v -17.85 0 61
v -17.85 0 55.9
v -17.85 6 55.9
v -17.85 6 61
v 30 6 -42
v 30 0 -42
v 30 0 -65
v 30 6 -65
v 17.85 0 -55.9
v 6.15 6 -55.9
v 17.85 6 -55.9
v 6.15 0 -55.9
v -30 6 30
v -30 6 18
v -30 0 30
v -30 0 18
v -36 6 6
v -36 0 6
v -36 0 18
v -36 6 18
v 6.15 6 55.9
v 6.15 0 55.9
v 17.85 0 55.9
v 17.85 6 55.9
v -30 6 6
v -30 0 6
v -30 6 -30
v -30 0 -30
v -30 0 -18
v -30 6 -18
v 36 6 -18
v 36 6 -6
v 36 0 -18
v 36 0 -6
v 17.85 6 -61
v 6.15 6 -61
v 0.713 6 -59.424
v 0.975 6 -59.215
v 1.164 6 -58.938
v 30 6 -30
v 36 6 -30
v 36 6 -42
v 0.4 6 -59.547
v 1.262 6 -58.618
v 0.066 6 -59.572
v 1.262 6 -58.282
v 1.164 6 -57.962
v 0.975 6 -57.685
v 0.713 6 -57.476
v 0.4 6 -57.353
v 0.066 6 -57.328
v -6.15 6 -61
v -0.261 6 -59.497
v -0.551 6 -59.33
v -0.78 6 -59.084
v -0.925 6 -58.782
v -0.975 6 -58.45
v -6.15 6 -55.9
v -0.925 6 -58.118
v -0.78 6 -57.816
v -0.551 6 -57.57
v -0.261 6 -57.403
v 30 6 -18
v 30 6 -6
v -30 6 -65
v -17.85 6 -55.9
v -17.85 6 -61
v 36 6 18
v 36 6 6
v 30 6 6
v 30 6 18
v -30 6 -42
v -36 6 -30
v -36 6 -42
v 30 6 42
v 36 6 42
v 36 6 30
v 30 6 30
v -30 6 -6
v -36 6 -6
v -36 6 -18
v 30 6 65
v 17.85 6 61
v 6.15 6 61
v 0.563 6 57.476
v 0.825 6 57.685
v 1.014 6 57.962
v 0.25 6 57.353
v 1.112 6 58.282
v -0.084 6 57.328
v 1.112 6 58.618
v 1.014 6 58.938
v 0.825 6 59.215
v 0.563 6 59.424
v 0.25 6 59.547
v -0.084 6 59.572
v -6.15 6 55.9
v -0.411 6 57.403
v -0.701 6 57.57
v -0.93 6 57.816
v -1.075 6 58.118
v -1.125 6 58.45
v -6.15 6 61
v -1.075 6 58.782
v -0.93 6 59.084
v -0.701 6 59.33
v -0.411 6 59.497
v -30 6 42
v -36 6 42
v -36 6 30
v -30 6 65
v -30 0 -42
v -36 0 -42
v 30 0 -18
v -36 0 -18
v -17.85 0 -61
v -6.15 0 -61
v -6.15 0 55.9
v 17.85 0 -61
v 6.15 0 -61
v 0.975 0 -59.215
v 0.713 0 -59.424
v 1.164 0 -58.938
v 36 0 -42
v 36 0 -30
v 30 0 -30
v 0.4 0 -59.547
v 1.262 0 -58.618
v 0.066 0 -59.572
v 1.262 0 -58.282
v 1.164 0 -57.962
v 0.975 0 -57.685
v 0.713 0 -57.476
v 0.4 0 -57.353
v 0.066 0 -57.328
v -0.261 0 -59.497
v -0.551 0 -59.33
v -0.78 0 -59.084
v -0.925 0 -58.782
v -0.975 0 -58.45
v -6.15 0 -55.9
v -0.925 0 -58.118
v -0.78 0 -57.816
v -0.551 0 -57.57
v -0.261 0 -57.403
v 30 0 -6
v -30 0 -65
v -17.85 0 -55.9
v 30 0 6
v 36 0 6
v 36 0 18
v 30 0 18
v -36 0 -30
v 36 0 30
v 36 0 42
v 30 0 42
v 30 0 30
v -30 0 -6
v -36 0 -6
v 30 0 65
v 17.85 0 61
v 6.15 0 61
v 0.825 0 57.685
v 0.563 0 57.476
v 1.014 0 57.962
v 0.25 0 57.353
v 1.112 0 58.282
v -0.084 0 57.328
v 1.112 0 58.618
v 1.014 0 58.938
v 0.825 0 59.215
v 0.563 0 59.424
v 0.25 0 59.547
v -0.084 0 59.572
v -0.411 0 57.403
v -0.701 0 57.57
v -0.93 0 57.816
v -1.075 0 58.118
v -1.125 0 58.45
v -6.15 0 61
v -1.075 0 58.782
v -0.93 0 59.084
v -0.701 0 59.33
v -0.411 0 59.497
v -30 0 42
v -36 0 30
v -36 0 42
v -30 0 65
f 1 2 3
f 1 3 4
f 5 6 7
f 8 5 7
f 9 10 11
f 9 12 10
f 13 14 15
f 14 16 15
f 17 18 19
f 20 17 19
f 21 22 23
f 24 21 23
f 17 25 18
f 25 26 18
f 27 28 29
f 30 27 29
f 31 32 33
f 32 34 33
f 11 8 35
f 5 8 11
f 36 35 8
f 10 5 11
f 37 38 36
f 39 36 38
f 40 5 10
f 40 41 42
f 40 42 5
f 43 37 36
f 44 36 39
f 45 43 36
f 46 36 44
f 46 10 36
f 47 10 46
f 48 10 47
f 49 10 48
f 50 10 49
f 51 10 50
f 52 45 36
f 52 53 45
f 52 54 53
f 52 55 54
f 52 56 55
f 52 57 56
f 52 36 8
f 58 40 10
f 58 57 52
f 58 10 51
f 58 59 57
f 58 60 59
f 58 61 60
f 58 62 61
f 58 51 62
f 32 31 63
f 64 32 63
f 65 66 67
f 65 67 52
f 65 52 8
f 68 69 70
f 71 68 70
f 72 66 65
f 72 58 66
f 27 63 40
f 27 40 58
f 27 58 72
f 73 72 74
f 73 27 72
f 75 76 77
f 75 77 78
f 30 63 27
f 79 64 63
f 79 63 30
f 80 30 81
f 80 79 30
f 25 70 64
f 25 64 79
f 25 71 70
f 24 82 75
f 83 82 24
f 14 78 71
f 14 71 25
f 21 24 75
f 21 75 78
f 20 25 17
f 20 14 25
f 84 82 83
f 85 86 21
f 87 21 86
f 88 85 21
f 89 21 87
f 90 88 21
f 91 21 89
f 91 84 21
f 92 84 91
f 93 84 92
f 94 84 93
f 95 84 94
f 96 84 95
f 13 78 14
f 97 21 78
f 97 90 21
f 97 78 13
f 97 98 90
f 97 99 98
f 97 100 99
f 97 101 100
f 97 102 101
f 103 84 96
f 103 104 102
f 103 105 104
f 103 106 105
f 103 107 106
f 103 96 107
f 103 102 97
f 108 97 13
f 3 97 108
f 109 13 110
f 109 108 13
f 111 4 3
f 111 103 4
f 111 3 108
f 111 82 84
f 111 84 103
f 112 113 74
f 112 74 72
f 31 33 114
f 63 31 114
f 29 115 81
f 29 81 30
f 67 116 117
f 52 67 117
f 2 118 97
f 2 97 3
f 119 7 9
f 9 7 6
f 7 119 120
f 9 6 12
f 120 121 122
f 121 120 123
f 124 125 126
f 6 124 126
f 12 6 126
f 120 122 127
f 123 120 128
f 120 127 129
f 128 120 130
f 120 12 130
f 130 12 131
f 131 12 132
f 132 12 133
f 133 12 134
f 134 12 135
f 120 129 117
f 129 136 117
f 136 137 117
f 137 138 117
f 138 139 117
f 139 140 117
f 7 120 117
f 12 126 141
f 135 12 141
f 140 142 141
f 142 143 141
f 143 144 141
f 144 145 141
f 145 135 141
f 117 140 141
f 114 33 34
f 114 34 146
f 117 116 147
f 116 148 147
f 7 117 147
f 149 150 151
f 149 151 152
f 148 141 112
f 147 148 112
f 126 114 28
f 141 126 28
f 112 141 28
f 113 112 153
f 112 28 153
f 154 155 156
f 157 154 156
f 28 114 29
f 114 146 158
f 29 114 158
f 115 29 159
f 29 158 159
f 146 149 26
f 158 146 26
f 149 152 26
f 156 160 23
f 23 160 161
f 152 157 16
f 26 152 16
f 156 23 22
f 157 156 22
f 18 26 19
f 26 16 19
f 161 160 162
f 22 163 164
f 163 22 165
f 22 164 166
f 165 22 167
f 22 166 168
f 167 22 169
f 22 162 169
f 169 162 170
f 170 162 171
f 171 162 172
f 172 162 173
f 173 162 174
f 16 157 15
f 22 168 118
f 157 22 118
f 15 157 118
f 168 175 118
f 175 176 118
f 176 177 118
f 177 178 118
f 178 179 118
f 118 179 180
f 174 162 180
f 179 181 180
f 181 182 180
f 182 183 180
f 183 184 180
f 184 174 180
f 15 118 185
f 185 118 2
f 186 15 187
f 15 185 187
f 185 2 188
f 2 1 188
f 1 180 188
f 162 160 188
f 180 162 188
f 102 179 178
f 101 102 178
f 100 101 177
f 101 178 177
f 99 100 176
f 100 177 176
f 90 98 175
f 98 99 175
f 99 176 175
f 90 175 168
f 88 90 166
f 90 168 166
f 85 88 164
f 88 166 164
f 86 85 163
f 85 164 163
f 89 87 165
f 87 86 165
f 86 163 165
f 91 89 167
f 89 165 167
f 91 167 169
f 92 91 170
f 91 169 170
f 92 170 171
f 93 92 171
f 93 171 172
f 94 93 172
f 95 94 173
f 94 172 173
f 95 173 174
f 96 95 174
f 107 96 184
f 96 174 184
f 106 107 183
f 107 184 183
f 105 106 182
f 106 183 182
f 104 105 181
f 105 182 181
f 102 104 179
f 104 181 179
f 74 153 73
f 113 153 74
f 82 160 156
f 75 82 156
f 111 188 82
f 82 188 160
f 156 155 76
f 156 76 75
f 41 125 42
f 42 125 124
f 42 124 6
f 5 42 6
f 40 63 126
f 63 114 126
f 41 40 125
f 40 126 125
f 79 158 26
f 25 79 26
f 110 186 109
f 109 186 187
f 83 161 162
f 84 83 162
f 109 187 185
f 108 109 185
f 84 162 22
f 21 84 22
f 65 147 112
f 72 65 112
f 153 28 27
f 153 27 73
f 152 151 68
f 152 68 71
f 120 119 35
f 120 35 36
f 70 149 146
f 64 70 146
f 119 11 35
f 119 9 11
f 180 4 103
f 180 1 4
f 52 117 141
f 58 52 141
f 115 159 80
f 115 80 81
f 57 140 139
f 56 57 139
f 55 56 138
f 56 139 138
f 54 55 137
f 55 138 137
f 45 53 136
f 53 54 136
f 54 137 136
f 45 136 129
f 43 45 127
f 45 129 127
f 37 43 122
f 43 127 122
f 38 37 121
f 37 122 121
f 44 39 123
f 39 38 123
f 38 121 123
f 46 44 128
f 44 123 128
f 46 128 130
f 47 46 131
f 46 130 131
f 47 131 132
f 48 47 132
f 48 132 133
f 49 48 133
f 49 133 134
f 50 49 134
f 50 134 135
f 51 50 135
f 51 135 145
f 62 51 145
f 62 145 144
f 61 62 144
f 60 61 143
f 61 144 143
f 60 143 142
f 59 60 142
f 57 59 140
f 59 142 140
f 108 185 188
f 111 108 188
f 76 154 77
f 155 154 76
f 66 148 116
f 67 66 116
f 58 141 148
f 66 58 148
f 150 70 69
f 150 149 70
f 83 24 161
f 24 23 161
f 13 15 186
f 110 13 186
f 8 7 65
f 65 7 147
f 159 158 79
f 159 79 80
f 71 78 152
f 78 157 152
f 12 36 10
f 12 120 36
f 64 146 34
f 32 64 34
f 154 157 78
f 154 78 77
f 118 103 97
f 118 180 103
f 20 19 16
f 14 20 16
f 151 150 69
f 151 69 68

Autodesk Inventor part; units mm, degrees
ref_plane "YZ Plane" through (0, 0, 0) normal (1, 0, 0) x (0, 1, 0)
ref_plane "XZ Plane" through (0, 0, 0) normal (0, 1, 0) x (-1, 0, 0)
ref_plane "XY Plane" through (0, 0, 0) normal (0, 0, 1) x (1, 0, 0)
sketch "Sketch1" plane through (0, 0, 0) normal (0, 1, 0) x (-1, 0, 0)
  line L0 (30, 65) -> (-30, 65)
  line L1 (-30, 65) -> (-30, -65)
  line L2 (-30, -65) -> (30, -65)
  line L3 (30, -65) -> (30, 65)
  line L4 (30, 65) -> (-30, -65) construction
  line L5 (-30, 65) -> (30, -65) construction
  line L6 (-17.85, 61) -> (-6.15, 61)
  line L7 (-6.15, 61) -> (-6.15, 55.9)
  line L8 (-6.15, 55.9) -> (-17.85, 55.9)
  line L9 (-17.85, 55.9) -> (-17.85, 61)
  line L10 (-30, 6) -> (-36, 6)
  line L11 (-36, 6) -> (-36, 18)
  line L12 (-36, 18) -> (-30, 18)
  line L13 (-30, 18) -> (-30, 6)
  line L14 (-30, 30) -> (-36, 30)
  line L15 (-36, 30) -> (-36, 42)
  line L16 (-36, 42) -> (-30, 42)
  line L17 (-30, 42) -> (-30, 30)
  line L18 (0, 0) -> (0, 6.5854)
  line L19 (0, 6.5854) -> (0, 0)
  line L20 (0, 0) -> (-5.5856, 0)
  line L21 (17.85, 61) -> (6.15, 61)
  line L22 (6.15, 61) -> (6.15, 55.9)
  line L23 (6.15, 55.9) -> (17.85, 55.9)
  line L24 (17.85, 55.9) -> (17.85, 61)
  line L25 (30, 6) -> (36, 6)
  line L26 (36, 6) -> (36, 18)
  line L27 (36, 18) -> (30, 18)
  line L28 (30, 18) -> (30, 6)
  line L29 (30, 30) -> (36, 30)
  line L30 (36, 30) -> (36, 42)
  line L31 (36, 42) -> (30, 42)
  line L32 (30, 42) -> (30, 30)
  line L33 (-17.85, -61) -> (-6.15, -61)
  line L34 (-6.15, -61) -> (-6.15, -55.9)
  line L35 (-6.15, -55.9) -> (-17.85, -55.9)
  line L36 (-17.85, -55.9) -> (-17.85, -61)
  line L37 (-30, -6) -> (-36, -6)
  line L38 (-36, -6) -> (-36, -18)
  line L39 (-36, -18) -> (-30, -18)
  line L40 (-30, -18) -> (-30, -6)
  line L41 (-30, -30) -> (-36, -30)
  line L42 (-36, -30) -> (-36, -42)
  line L43 (-36, -42) -> (-30, -42)
  line L44 (-30, -42) -> (-30, -30)
  line L45 (6.15, -55.9) -> (17.85, -55.9)
  line L46 (17.85, -61) -> (6.15, -61)
  line L47 (6.15, -61) -> (6.15, -55.9)
  line L48 (17.85, -55.9) -> (17.85, -61)
  line L49 (30, -18) -> (30, -6)
  line L50 (36, -42) -> (30, -42)
  line L51 (36, -30) -> (36, -42)
  line L52 (30, -6) -> (36, -6)
  line L53 (36, -6) -> (36, -18)
  line L54 (30, -42) -> (30, -30)
  line L55 (36, -18) -> (30, -18)
  line L56 (30, -30) -> (36, -30)
  circle A0 centre (-0.15, -58.45) radius 1.125
  circle A1 centre (0, 58.45) radius 1.125
  dimension "d0" = 60
  dimension "d1" = 130
  dimension "d2" = 6
  dimension "d3" = 12
  dimension "d4" = 12
  dimension "d5" = 12
  dimension "d6" = 6
  dimension "d9" = 4
  dimension "d10" = 5.1
  dimension "d13" = 12.3
  dimension "d14" = 11.7
  dimension "d15" = 2.25
  dimension "d16" = 2.25
  dimension "d17" = 6.15
  dimension "d18" = 2.55
  dimension "d19" = 6.3
  dimension "d20" = 2.55
extrude "Extrusion1" add sketch "Sketch1" along normal blind 6
properties part number "case_side" material "Acrylic, Clear"
